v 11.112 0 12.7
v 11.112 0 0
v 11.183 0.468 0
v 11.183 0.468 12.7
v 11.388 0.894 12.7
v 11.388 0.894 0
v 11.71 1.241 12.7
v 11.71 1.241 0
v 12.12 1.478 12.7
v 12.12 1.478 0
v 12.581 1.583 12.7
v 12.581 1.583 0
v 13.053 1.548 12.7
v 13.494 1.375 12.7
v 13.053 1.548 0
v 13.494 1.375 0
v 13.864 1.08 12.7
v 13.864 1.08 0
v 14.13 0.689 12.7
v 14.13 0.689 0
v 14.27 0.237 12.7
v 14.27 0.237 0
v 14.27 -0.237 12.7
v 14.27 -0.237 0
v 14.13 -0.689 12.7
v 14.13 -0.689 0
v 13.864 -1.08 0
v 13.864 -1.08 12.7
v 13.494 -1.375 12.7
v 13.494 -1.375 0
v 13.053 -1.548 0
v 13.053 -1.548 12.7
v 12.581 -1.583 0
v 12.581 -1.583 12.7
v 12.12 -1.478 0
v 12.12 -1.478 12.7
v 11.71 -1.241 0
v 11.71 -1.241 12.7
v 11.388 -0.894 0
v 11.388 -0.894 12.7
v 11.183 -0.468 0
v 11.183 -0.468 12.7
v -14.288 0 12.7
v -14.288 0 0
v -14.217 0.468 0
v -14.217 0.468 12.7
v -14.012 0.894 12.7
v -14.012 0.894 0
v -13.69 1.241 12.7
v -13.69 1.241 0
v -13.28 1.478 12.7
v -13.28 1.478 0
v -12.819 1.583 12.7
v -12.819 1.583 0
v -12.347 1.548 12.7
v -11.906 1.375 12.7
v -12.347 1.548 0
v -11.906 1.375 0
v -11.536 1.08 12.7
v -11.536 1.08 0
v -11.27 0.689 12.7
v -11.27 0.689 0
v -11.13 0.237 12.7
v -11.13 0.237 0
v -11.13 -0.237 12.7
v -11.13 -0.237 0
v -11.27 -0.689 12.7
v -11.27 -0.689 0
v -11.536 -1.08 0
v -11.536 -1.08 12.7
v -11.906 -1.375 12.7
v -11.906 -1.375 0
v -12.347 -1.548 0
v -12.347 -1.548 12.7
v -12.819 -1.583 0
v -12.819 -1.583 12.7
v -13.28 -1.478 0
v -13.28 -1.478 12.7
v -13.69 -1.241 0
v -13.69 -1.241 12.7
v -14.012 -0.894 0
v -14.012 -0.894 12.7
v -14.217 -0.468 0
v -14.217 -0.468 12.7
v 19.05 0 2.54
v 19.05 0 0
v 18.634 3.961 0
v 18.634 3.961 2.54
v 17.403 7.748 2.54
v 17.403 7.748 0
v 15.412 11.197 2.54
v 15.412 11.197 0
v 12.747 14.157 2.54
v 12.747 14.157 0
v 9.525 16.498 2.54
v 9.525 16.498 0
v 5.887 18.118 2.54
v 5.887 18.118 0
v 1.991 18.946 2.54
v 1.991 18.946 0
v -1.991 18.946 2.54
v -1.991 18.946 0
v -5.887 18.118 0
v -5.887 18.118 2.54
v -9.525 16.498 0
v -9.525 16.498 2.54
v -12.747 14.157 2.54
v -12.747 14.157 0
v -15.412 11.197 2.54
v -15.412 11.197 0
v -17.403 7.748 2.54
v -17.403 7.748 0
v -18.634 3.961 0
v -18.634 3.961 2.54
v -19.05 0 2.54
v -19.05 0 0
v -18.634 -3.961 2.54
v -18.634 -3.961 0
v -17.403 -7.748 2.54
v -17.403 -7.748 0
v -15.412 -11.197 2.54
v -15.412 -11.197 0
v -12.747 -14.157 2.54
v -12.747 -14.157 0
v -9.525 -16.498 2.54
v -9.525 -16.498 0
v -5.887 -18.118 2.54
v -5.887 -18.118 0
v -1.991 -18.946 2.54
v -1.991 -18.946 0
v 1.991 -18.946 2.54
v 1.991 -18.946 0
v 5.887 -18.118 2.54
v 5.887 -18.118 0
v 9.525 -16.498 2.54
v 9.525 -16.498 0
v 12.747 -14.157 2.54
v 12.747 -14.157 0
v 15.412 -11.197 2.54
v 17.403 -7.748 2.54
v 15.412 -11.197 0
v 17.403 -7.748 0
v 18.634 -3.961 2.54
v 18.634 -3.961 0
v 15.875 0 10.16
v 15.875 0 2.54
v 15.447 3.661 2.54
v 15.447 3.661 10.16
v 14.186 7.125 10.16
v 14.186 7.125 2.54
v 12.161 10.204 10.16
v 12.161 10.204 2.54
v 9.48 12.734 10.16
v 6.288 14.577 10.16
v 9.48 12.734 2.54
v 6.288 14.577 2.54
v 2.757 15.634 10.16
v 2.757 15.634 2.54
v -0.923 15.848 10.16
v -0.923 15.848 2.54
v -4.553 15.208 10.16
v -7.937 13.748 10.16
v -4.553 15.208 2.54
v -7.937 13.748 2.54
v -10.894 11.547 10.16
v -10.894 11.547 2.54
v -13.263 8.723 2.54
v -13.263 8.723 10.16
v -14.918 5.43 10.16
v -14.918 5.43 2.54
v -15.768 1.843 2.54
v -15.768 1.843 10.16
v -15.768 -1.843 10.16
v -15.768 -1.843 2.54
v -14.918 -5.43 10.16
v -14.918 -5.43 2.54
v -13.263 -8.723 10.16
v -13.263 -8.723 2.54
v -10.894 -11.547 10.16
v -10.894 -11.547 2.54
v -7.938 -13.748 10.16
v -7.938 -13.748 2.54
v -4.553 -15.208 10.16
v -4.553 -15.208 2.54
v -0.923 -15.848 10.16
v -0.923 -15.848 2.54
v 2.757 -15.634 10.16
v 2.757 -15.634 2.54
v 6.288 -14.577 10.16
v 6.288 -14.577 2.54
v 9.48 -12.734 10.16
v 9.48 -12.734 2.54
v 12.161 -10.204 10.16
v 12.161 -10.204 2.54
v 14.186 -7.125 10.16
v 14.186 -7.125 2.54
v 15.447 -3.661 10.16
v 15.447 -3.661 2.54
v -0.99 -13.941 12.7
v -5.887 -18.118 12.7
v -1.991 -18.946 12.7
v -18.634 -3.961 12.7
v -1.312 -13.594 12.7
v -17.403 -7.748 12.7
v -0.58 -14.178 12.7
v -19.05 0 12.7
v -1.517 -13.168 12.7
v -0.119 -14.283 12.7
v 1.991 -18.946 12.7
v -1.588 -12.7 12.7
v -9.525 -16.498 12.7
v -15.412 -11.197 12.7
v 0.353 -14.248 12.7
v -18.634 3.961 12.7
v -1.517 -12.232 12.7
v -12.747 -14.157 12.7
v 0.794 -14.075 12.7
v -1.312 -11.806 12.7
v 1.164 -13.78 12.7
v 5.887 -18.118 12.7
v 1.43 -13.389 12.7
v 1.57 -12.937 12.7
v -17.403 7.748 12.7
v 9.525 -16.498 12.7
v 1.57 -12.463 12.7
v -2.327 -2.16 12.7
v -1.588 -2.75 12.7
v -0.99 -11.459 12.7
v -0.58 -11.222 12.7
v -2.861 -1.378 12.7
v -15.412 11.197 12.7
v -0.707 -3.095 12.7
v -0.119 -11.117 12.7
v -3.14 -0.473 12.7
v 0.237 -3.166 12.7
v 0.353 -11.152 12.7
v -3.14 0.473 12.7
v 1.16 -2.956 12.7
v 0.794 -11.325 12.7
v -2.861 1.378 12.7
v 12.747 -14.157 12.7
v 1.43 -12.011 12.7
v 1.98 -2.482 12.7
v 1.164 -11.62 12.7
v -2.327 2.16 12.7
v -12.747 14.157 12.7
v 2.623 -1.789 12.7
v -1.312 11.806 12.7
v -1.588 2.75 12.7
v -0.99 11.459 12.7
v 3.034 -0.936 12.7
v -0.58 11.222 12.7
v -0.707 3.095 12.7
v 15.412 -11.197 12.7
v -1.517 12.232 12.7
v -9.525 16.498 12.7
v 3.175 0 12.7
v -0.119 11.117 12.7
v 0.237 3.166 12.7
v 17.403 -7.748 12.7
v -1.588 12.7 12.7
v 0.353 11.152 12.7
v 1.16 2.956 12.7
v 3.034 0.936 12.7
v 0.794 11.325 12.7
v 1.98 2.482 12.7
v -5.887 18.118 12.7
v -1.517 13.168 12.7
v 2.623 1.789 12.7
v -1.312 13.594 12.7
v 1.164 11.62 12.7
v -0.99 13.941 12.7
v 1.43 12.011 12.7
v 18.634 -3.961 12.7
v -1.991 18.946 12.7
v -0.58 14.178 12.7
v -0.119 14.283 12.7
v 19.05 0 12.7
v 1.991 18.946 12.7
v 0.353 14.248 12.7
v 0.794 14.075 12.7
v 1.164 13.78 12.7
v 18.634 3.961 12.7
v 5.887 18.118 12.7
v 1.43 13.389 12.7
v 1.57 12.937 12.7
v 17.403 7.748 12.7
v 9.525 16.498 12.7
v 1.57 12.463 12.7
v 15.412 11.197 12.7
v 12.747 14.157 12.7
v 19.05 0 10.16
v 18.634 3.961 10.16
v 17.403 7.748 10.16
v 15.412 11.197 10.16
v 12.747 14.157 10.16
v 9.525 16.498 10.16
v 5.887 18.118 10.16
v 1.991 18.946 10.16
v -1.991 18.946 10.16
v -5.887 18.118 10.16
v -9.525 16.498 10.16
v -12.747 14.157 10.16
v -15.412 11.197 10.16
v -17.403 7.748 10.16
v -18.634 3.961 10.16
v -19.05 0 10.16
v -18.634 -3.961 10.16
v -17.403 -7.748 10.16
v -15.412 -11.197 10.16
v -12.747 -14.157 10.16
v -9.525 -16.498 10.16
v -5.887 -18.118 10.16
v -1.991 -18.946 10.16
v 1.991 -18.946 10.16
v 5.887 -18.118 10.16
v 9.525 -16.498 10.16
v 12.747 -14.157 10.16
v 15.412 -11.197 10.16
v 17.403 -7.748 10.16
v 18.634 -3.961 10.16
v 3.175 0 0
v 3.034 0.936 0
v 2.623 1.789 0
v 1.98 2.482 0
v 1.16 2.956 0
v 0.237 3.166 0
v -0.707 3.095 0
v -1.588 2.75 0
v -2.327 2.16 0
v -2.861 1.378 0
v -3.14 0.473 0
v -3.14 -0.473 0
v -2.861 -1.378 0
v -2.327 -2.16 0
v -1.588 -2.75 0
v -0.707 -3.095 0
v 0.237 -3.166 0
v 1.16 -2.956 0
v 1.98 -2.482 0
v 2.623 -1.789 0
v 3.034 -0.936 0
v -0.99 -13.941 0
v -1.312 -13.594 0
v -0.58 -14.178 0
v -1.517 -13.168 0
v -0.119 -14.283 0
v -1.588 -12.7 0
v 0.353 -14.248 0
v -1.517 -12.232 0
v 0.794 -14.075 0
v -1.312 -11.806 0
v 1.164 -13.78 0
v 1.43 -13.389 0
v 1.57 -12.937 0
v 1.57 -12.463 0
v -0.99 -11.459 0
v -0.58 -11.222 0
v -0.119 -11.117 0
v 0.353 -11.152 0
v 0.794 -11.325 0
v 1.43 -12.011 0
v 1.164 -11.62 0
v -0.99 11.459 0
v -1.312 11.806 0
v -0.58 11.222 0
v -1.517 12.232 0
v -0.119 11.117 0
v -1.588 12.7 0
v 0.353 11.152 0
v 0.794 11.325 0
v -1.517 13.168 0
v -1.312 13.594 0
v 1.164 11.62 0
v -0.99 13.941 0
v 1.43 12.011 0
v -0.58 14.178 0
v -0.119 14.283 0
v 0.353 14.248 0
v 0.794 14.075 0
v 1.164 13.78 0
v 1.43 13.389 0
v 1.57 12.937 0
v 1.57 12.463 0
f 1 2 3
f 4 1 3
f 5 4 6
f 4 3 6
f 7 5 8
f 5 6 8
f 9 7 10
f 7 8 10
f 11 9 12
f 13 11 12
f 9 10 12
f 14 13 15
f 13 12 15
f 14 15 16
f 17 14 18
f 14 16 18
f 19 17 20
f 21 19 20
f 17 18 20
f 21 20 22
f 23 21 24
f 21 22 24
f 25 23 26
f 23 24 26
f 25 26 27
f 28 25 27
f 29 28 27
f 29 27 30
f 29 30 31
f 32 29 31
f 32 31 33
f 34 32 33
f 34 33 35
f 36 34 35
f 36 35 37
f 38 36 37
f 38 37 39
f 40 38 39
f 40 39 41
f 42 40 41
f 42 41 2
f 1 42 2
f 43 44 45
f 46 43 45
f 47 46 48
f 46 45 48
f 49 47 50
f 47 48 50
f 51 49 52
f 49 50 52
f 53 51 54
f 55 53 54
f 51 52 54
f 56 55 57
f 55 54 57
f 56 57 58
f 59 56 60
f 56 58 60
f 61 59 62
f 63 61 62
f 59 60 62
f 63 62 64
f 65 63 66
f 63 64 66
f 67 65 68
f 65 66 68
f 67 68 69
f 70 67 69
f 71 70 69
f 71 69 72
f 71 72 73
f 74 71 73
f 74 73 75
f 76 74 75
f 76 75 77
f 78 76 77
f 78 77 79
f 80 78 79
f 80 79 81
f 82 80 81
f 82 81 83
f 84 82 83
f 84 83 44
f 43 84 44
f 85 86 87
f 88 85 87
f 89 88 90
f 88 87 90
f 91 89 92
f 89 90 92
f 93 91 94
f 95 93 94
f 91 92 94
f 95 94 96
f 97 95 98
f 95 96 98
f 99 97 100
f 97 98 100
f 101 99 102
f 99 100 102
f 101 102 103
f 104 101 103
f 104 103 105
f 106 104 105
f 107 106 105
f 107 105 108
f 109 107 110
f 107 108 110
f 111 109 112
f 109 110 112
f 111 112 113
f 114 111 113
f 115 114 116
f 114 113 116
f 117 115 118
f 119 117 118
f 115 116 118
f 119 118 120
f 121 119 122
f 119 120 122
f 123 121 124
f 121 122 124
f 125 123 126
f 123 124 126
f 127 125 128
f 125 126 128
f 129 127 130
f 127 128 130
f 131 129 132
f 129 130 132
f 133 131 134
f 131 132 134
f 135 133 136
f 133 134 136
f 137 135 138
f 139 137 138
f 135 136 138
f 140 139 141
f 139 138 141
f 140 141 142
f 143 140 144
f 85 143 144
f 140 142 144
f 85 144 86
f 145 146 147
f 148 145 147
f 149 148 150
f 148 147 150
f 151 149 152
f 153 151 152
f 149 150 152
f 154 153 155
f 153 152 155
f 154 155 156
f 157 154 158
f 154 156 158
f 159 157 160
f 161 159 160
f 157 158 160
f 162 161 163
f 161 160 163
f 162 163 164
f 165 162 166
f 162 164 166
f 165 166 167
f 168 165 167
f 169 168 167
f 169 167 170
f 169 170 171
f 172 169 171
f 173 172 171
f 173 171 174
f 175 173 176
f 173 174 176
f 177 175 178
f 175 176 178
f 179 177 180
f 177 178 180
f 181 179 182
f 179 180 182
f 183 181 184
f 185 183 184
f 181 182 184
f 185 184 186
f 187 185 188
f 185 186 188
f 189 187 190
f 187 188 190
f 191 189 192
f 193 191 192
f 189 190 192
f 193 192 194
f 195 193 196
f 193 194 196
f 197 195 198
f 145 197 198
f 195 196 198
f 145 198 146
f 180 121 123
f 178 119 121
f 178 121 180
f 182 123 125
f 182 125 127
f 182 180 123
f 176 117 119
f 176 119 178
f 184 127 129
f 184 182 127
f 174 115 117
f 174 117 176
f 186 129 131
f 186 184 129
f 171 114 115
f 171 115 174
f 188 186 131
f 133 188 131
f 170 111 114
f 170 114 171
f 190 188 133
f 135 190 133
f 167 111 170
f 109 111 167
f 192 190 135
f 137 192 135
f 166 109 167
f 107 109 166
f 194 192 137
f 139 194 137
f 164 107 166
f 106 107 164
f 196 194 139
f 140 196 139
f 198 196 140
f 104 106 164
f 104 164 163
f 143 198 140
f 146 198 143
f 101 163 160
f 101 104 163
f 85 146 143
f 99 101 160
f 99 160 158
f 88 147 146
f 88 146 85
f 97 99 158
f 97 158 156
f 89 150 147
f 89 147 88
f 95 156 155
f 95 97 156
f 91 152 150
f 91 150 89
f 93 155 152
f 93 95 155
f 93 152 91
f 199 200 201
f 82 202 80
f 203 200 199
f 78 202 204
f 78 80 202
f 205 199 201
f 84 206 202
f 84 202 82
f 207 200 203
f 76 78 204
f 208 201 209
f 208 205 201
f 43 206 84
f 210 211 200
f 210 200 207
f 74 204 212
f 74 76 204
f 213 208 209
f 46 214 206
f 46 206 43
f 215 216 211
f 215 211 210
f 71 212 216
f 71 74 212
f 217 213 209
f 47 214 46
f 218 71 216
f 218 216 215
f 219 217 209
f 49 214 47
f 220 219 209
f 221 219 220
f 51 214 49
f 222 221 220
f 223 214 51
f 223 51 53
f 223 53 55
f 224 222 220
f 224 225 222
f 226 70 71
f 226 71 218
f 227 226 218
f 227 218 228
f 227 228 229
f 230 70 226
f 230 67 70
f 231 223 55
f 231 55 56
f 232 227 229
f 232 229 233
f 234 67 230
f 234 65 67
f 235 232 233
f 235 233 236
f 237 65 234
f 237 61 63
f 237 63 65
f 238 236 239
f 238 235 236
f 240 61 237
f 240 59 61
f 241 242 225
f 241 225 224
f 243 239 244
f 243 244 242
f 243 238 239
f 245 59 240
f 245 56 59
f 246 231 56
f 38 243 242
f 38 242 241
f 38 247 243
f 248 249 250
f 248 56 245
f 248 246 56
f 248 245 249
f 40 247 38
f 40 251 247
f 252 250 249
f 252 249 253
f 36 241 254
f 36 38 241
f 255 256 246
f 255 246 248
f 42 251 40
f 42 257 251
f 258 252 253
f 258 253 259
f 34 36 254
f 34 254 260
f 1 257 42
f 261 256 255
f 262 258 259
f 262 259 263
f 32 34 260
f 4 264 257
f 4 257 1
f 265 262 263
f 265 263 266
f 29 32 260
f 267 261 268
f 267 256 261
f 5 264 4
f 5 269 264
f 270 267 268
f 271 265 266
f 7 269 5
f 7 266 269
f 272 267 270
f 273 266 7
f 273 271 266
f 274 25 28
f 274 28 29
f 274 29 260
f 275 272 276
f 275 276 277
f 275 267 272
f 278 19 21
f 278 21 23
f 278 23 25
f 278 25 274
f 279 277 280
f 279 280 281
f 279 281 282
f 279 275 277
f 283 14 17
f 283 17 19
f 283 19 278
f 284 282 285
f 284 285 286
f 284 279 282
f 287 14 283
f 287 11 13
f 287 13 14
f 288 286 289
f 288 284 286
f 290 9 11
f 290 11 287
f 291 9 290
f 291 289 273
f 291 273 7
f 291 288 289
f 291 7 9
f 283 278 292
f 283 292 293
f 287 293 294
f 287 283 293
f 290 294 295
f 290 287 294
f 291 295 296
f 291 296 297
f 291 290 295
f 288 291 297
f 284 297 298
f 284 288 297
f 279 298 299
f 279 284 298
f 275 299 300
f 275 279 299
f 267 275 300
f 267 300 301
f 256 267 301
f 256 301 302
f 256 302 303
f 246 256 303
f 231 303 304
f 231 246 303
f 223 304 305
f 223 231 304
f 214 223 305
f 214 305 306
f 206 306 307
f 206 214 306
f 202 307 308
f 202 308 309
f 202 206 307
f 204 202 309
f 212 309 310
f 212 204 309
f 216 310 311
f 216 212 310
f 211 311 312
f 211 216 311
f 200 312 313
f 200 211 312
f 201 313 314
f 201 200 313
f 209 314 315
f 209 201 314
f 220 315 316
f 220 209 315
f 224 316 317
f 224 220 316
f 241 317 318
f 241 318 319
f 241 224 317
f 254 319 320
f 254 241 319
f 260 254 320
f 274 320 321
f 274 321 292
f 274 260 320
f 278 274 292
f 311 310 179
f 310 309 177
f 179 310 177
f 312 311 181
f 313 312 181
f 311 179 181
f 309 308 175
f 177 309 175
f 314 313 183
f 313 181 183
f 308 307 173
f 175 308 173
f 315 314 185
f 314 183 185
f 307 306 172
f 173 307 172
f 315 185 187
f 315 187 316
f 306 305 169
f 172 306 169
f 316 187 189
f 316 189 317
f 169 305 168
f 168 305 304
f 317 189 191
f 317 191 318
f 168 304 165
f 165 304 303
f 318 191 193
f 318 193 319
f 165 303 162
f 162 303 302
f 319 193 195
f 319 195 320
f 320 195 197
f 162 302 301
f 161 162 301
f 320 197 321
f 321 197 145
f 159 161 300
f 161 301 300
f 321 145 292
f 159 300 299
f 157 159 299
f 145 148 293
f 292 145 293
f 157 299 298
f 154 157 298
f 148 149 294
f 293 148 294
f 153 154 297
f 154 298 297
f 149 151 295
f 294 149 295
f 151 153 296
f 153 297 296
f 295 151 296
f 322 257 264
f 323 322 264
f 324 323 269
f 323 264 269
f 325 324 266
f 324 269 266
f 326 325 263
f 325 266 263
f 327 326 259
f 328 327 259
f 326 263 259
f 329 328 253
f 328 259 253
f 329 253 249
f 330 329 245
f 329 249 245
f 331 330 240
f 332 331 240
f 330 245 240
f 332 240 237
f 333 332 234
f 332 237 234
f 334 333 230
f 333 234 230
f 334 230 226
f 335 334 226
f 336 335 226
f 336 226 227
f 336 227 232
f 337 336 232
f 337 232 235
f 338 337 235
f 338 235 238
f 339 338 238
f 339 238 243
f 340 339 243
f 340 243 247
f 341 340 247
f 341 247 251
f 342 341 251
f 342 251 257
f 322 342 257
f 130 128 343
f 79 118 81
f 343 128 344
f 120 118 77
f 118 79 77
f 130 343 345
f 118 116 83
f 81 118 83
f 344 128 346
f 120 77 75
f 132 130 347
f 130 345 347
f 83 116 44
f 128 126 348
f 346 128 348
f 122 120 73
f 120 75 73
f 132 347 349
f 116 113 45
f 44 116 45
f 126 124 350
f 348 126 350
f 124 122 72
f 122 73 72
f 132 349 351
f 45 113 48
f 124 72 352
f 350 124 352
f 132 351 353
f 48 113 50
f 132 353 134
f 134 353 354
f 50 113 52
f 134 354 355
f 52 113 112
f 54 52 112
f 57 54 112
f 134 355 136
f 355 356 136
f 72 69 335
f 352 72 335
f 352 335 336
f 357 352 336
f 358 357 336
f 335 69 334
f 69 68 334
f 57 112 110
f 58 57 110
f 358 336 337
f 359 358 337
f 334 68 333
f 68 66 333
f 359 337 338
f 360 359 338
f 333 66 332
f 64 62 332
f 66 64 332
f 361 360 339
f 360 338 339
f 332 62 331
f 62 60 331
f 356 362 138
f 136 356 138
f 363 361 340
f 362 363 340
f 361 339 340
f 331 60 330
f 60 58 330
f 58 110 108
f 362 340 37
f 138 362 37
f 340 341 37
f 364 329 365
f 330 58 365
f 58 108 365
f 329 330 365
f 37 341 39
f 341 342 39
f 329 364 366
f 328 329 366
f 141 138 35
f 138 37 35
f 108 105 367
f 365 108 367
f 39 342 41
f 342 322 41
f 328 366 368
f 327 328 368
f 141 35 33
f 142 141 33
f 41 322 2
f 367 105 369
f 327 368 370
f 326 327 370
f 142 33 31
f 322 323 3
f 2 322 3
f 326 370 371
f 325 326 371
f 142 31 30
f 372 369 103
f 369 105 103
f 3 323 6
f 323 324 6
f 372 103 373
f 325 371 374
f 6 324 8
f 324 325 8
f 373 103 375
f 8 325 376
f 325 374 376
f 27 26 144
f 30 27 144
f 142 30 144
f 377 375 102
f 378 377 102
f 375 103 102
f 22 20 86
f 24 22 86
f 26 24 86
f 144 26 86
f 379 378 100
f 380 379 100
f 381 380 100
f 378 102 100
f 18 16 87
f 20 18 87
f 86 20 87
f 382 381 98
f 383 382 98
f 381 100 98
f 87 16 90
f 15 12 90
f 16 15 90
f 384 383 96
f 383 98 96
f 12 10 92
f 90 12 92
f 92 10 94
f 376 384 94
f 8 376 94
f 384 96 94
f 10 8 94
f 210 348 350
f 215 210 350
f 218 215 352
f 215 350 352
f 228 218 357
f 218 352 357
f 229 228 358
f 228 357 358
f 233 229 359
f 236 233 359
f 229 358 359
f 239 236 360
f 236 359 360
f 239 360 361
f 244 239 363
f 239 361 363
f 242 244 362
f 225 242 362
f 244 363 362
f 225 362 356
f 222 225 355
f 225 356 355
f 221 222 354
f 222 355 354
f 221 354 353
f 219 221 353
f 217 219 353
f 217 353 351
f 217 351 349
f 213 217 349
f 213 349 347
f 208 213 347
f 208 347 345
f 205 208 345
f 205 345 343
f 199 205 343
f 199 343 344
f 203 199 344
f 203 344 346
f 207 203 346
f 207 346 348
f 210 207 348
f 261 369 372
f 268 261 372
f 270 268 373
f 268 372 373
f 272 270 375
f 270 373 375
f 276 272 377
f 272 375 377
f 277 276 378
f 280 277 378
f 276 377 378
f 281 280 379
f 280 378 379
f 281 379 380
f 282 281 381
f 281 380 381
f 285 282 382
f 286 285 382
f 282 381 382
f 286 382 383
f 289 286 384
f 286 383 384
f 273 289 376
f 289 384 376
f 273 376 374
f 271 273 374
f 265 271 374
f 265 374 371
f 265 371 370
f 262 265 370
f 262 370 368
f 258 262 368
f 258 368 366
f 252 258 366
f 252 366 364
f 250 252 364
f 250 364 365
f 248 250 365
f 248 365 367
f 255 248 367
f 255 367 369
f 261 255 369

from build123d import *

# Parameters (mm, degrees)
SKETCH1_R           = 19.05
BOSS_EXTRUDE1_DEPTH = 2.54
SKETCH2_R           = 15.875
BOSS_EXTRUDE2_DEPTH = 7.62
CUT_EXTRUDE1_REACH  = 14.7
SKETCH4_R           = 3.175
CUT_EXTRUDE2_REACH  = 14.7
SKETCH5_R           = 1.5875


with BuildPart() as part:
    # Sketch1 → Boss-Extrude1 (new body)
    with BuildSketch(Plane.XY):
        Circle(SKETCH1_R)
    boss_extrude1 = extrude(amount=BOSS_EXTRUDE1_DEPTH)

    # Sketch2 → Boss-Extrude2 (add)
    with BuildSketch(Plane.XY.offset(2.54)):
        Circle(SKETCH2_R)
    extrude(amount=BOSS_EXTRUDE2_DEPTH)

    # Mirror1: Boss-Extrude1 across plane
    add(boss_extrude1.mirror(Plane.XY.offset(6.35)))

    # Sketch4 → Cut-Extrude1 (cut, up to next)
    with BuildSketch(Plane.XY.offset(12.7), mode=Mode.PRIVATE) as cut_extrude1_sk1:
        Circle(SKETCH4_R)
    cut_extrude1_tool1 = extrude(cut_extrude1_sk1.sketch, amount=-CUT_EXTRUDE1_REACH, mode=Mode.PRIVATE) & part.part
    add(cut_extrude1_tool1.solids().sort_by_distance((0, 0, 12.7))[0], mode=Mode.SUBTRACT)

    # Sketch5 → Cut-Extrude2 (cut, up to next)
    with BuildSketch(Plane(origin=(0, 0, 0), x_dir=(-1, 0, 0), z_dir=(0, 0, -1)), mode=Mode.PRIVATE) as cut_extrude2_sk1:
        with Locations((0, 12.7)):
            Circle(SKETCH5_R)
    cut_extrude2_tool1 = extrude(cut_extrude2_sk1.sketch, amount=-CUT_EXTRUDE2_REACH, mode=Mode.PRIVATE) & part.part
    add(cut_extrude2_tool1.solids().sort_by_distance((0, 12.7, 0))[0], mode=Mode.SUBTRACT)
    # Sketch5 → Cut-Extrude2 (cut, up to next)
    with BuildSketch(Plane(origin=(0, 0, 0), x_dir=(-1, 0, 0), z_dir=(0, 0, -1)), mode=Mode.PRIVATE) as cut_extrude2_sk2:
        with Locations((12.7, 0)):
            Circle(SKETCH5_R)
    cut_extrude2_tool2 = extrude(cut_extrude2_sk2.sketch, amount=-CUT_EXTRUDE2_REACH, mode=Mode.PRIVATE) & part.part
    add(cut_extrude2_tool2.solids().sort_by_distance((-12.7, 0, 0))[0], mode=Mode.SUBTRACT)
    # Sketch5 → Cut-Extrude2 (cut, up to next)
    with BuildSketch(Plane(origin=(0, 0, 0), x_dir=(-1, 0, 0), z_dir=(0, 0, -1)), mode=Mode.PRIVATE) as cut_extrude2_sk3:
        with Locations((0, -12.7)):
            Circle(SKETCH5_R)
    cut_extrude2_tool3 = extrude(cut_extrude2_sk3.sketch, amount=-CUT_EXTRUDE2_REACH, mode=Mode.PRIVATE) & part.part
    add(cut_extrude2_tool3.solids().sort_by_distance((0, -12.7, 0))[0], mode=Mode.SUBTRACT)
    # Sketch5 → Cut-Extrude2 (cut, up to next)
    with BuildSketch(Plane(origin=(0, 0, 0), x_dir=(-1, 0, 0), z_dir=(0, 0, -1)), mode=Mode.PRIVATE) as cut_extrude2_sk4:
        with Locations((-12.7, 0)):
            Circle(SKETCH5_R)
    cut_extrude2_tool4 = extrude(cut_extrude2_sk4.sketch, amount=-CUT_EXTRUDE2_REACH, mode=Mode.PRIVATE) & part.part
    add(cut_extrude2_tool4.solids().sort_by_distance((12.7, 0, 0))[0], mode=Mode.SUBTRACT)


solid = part.part
